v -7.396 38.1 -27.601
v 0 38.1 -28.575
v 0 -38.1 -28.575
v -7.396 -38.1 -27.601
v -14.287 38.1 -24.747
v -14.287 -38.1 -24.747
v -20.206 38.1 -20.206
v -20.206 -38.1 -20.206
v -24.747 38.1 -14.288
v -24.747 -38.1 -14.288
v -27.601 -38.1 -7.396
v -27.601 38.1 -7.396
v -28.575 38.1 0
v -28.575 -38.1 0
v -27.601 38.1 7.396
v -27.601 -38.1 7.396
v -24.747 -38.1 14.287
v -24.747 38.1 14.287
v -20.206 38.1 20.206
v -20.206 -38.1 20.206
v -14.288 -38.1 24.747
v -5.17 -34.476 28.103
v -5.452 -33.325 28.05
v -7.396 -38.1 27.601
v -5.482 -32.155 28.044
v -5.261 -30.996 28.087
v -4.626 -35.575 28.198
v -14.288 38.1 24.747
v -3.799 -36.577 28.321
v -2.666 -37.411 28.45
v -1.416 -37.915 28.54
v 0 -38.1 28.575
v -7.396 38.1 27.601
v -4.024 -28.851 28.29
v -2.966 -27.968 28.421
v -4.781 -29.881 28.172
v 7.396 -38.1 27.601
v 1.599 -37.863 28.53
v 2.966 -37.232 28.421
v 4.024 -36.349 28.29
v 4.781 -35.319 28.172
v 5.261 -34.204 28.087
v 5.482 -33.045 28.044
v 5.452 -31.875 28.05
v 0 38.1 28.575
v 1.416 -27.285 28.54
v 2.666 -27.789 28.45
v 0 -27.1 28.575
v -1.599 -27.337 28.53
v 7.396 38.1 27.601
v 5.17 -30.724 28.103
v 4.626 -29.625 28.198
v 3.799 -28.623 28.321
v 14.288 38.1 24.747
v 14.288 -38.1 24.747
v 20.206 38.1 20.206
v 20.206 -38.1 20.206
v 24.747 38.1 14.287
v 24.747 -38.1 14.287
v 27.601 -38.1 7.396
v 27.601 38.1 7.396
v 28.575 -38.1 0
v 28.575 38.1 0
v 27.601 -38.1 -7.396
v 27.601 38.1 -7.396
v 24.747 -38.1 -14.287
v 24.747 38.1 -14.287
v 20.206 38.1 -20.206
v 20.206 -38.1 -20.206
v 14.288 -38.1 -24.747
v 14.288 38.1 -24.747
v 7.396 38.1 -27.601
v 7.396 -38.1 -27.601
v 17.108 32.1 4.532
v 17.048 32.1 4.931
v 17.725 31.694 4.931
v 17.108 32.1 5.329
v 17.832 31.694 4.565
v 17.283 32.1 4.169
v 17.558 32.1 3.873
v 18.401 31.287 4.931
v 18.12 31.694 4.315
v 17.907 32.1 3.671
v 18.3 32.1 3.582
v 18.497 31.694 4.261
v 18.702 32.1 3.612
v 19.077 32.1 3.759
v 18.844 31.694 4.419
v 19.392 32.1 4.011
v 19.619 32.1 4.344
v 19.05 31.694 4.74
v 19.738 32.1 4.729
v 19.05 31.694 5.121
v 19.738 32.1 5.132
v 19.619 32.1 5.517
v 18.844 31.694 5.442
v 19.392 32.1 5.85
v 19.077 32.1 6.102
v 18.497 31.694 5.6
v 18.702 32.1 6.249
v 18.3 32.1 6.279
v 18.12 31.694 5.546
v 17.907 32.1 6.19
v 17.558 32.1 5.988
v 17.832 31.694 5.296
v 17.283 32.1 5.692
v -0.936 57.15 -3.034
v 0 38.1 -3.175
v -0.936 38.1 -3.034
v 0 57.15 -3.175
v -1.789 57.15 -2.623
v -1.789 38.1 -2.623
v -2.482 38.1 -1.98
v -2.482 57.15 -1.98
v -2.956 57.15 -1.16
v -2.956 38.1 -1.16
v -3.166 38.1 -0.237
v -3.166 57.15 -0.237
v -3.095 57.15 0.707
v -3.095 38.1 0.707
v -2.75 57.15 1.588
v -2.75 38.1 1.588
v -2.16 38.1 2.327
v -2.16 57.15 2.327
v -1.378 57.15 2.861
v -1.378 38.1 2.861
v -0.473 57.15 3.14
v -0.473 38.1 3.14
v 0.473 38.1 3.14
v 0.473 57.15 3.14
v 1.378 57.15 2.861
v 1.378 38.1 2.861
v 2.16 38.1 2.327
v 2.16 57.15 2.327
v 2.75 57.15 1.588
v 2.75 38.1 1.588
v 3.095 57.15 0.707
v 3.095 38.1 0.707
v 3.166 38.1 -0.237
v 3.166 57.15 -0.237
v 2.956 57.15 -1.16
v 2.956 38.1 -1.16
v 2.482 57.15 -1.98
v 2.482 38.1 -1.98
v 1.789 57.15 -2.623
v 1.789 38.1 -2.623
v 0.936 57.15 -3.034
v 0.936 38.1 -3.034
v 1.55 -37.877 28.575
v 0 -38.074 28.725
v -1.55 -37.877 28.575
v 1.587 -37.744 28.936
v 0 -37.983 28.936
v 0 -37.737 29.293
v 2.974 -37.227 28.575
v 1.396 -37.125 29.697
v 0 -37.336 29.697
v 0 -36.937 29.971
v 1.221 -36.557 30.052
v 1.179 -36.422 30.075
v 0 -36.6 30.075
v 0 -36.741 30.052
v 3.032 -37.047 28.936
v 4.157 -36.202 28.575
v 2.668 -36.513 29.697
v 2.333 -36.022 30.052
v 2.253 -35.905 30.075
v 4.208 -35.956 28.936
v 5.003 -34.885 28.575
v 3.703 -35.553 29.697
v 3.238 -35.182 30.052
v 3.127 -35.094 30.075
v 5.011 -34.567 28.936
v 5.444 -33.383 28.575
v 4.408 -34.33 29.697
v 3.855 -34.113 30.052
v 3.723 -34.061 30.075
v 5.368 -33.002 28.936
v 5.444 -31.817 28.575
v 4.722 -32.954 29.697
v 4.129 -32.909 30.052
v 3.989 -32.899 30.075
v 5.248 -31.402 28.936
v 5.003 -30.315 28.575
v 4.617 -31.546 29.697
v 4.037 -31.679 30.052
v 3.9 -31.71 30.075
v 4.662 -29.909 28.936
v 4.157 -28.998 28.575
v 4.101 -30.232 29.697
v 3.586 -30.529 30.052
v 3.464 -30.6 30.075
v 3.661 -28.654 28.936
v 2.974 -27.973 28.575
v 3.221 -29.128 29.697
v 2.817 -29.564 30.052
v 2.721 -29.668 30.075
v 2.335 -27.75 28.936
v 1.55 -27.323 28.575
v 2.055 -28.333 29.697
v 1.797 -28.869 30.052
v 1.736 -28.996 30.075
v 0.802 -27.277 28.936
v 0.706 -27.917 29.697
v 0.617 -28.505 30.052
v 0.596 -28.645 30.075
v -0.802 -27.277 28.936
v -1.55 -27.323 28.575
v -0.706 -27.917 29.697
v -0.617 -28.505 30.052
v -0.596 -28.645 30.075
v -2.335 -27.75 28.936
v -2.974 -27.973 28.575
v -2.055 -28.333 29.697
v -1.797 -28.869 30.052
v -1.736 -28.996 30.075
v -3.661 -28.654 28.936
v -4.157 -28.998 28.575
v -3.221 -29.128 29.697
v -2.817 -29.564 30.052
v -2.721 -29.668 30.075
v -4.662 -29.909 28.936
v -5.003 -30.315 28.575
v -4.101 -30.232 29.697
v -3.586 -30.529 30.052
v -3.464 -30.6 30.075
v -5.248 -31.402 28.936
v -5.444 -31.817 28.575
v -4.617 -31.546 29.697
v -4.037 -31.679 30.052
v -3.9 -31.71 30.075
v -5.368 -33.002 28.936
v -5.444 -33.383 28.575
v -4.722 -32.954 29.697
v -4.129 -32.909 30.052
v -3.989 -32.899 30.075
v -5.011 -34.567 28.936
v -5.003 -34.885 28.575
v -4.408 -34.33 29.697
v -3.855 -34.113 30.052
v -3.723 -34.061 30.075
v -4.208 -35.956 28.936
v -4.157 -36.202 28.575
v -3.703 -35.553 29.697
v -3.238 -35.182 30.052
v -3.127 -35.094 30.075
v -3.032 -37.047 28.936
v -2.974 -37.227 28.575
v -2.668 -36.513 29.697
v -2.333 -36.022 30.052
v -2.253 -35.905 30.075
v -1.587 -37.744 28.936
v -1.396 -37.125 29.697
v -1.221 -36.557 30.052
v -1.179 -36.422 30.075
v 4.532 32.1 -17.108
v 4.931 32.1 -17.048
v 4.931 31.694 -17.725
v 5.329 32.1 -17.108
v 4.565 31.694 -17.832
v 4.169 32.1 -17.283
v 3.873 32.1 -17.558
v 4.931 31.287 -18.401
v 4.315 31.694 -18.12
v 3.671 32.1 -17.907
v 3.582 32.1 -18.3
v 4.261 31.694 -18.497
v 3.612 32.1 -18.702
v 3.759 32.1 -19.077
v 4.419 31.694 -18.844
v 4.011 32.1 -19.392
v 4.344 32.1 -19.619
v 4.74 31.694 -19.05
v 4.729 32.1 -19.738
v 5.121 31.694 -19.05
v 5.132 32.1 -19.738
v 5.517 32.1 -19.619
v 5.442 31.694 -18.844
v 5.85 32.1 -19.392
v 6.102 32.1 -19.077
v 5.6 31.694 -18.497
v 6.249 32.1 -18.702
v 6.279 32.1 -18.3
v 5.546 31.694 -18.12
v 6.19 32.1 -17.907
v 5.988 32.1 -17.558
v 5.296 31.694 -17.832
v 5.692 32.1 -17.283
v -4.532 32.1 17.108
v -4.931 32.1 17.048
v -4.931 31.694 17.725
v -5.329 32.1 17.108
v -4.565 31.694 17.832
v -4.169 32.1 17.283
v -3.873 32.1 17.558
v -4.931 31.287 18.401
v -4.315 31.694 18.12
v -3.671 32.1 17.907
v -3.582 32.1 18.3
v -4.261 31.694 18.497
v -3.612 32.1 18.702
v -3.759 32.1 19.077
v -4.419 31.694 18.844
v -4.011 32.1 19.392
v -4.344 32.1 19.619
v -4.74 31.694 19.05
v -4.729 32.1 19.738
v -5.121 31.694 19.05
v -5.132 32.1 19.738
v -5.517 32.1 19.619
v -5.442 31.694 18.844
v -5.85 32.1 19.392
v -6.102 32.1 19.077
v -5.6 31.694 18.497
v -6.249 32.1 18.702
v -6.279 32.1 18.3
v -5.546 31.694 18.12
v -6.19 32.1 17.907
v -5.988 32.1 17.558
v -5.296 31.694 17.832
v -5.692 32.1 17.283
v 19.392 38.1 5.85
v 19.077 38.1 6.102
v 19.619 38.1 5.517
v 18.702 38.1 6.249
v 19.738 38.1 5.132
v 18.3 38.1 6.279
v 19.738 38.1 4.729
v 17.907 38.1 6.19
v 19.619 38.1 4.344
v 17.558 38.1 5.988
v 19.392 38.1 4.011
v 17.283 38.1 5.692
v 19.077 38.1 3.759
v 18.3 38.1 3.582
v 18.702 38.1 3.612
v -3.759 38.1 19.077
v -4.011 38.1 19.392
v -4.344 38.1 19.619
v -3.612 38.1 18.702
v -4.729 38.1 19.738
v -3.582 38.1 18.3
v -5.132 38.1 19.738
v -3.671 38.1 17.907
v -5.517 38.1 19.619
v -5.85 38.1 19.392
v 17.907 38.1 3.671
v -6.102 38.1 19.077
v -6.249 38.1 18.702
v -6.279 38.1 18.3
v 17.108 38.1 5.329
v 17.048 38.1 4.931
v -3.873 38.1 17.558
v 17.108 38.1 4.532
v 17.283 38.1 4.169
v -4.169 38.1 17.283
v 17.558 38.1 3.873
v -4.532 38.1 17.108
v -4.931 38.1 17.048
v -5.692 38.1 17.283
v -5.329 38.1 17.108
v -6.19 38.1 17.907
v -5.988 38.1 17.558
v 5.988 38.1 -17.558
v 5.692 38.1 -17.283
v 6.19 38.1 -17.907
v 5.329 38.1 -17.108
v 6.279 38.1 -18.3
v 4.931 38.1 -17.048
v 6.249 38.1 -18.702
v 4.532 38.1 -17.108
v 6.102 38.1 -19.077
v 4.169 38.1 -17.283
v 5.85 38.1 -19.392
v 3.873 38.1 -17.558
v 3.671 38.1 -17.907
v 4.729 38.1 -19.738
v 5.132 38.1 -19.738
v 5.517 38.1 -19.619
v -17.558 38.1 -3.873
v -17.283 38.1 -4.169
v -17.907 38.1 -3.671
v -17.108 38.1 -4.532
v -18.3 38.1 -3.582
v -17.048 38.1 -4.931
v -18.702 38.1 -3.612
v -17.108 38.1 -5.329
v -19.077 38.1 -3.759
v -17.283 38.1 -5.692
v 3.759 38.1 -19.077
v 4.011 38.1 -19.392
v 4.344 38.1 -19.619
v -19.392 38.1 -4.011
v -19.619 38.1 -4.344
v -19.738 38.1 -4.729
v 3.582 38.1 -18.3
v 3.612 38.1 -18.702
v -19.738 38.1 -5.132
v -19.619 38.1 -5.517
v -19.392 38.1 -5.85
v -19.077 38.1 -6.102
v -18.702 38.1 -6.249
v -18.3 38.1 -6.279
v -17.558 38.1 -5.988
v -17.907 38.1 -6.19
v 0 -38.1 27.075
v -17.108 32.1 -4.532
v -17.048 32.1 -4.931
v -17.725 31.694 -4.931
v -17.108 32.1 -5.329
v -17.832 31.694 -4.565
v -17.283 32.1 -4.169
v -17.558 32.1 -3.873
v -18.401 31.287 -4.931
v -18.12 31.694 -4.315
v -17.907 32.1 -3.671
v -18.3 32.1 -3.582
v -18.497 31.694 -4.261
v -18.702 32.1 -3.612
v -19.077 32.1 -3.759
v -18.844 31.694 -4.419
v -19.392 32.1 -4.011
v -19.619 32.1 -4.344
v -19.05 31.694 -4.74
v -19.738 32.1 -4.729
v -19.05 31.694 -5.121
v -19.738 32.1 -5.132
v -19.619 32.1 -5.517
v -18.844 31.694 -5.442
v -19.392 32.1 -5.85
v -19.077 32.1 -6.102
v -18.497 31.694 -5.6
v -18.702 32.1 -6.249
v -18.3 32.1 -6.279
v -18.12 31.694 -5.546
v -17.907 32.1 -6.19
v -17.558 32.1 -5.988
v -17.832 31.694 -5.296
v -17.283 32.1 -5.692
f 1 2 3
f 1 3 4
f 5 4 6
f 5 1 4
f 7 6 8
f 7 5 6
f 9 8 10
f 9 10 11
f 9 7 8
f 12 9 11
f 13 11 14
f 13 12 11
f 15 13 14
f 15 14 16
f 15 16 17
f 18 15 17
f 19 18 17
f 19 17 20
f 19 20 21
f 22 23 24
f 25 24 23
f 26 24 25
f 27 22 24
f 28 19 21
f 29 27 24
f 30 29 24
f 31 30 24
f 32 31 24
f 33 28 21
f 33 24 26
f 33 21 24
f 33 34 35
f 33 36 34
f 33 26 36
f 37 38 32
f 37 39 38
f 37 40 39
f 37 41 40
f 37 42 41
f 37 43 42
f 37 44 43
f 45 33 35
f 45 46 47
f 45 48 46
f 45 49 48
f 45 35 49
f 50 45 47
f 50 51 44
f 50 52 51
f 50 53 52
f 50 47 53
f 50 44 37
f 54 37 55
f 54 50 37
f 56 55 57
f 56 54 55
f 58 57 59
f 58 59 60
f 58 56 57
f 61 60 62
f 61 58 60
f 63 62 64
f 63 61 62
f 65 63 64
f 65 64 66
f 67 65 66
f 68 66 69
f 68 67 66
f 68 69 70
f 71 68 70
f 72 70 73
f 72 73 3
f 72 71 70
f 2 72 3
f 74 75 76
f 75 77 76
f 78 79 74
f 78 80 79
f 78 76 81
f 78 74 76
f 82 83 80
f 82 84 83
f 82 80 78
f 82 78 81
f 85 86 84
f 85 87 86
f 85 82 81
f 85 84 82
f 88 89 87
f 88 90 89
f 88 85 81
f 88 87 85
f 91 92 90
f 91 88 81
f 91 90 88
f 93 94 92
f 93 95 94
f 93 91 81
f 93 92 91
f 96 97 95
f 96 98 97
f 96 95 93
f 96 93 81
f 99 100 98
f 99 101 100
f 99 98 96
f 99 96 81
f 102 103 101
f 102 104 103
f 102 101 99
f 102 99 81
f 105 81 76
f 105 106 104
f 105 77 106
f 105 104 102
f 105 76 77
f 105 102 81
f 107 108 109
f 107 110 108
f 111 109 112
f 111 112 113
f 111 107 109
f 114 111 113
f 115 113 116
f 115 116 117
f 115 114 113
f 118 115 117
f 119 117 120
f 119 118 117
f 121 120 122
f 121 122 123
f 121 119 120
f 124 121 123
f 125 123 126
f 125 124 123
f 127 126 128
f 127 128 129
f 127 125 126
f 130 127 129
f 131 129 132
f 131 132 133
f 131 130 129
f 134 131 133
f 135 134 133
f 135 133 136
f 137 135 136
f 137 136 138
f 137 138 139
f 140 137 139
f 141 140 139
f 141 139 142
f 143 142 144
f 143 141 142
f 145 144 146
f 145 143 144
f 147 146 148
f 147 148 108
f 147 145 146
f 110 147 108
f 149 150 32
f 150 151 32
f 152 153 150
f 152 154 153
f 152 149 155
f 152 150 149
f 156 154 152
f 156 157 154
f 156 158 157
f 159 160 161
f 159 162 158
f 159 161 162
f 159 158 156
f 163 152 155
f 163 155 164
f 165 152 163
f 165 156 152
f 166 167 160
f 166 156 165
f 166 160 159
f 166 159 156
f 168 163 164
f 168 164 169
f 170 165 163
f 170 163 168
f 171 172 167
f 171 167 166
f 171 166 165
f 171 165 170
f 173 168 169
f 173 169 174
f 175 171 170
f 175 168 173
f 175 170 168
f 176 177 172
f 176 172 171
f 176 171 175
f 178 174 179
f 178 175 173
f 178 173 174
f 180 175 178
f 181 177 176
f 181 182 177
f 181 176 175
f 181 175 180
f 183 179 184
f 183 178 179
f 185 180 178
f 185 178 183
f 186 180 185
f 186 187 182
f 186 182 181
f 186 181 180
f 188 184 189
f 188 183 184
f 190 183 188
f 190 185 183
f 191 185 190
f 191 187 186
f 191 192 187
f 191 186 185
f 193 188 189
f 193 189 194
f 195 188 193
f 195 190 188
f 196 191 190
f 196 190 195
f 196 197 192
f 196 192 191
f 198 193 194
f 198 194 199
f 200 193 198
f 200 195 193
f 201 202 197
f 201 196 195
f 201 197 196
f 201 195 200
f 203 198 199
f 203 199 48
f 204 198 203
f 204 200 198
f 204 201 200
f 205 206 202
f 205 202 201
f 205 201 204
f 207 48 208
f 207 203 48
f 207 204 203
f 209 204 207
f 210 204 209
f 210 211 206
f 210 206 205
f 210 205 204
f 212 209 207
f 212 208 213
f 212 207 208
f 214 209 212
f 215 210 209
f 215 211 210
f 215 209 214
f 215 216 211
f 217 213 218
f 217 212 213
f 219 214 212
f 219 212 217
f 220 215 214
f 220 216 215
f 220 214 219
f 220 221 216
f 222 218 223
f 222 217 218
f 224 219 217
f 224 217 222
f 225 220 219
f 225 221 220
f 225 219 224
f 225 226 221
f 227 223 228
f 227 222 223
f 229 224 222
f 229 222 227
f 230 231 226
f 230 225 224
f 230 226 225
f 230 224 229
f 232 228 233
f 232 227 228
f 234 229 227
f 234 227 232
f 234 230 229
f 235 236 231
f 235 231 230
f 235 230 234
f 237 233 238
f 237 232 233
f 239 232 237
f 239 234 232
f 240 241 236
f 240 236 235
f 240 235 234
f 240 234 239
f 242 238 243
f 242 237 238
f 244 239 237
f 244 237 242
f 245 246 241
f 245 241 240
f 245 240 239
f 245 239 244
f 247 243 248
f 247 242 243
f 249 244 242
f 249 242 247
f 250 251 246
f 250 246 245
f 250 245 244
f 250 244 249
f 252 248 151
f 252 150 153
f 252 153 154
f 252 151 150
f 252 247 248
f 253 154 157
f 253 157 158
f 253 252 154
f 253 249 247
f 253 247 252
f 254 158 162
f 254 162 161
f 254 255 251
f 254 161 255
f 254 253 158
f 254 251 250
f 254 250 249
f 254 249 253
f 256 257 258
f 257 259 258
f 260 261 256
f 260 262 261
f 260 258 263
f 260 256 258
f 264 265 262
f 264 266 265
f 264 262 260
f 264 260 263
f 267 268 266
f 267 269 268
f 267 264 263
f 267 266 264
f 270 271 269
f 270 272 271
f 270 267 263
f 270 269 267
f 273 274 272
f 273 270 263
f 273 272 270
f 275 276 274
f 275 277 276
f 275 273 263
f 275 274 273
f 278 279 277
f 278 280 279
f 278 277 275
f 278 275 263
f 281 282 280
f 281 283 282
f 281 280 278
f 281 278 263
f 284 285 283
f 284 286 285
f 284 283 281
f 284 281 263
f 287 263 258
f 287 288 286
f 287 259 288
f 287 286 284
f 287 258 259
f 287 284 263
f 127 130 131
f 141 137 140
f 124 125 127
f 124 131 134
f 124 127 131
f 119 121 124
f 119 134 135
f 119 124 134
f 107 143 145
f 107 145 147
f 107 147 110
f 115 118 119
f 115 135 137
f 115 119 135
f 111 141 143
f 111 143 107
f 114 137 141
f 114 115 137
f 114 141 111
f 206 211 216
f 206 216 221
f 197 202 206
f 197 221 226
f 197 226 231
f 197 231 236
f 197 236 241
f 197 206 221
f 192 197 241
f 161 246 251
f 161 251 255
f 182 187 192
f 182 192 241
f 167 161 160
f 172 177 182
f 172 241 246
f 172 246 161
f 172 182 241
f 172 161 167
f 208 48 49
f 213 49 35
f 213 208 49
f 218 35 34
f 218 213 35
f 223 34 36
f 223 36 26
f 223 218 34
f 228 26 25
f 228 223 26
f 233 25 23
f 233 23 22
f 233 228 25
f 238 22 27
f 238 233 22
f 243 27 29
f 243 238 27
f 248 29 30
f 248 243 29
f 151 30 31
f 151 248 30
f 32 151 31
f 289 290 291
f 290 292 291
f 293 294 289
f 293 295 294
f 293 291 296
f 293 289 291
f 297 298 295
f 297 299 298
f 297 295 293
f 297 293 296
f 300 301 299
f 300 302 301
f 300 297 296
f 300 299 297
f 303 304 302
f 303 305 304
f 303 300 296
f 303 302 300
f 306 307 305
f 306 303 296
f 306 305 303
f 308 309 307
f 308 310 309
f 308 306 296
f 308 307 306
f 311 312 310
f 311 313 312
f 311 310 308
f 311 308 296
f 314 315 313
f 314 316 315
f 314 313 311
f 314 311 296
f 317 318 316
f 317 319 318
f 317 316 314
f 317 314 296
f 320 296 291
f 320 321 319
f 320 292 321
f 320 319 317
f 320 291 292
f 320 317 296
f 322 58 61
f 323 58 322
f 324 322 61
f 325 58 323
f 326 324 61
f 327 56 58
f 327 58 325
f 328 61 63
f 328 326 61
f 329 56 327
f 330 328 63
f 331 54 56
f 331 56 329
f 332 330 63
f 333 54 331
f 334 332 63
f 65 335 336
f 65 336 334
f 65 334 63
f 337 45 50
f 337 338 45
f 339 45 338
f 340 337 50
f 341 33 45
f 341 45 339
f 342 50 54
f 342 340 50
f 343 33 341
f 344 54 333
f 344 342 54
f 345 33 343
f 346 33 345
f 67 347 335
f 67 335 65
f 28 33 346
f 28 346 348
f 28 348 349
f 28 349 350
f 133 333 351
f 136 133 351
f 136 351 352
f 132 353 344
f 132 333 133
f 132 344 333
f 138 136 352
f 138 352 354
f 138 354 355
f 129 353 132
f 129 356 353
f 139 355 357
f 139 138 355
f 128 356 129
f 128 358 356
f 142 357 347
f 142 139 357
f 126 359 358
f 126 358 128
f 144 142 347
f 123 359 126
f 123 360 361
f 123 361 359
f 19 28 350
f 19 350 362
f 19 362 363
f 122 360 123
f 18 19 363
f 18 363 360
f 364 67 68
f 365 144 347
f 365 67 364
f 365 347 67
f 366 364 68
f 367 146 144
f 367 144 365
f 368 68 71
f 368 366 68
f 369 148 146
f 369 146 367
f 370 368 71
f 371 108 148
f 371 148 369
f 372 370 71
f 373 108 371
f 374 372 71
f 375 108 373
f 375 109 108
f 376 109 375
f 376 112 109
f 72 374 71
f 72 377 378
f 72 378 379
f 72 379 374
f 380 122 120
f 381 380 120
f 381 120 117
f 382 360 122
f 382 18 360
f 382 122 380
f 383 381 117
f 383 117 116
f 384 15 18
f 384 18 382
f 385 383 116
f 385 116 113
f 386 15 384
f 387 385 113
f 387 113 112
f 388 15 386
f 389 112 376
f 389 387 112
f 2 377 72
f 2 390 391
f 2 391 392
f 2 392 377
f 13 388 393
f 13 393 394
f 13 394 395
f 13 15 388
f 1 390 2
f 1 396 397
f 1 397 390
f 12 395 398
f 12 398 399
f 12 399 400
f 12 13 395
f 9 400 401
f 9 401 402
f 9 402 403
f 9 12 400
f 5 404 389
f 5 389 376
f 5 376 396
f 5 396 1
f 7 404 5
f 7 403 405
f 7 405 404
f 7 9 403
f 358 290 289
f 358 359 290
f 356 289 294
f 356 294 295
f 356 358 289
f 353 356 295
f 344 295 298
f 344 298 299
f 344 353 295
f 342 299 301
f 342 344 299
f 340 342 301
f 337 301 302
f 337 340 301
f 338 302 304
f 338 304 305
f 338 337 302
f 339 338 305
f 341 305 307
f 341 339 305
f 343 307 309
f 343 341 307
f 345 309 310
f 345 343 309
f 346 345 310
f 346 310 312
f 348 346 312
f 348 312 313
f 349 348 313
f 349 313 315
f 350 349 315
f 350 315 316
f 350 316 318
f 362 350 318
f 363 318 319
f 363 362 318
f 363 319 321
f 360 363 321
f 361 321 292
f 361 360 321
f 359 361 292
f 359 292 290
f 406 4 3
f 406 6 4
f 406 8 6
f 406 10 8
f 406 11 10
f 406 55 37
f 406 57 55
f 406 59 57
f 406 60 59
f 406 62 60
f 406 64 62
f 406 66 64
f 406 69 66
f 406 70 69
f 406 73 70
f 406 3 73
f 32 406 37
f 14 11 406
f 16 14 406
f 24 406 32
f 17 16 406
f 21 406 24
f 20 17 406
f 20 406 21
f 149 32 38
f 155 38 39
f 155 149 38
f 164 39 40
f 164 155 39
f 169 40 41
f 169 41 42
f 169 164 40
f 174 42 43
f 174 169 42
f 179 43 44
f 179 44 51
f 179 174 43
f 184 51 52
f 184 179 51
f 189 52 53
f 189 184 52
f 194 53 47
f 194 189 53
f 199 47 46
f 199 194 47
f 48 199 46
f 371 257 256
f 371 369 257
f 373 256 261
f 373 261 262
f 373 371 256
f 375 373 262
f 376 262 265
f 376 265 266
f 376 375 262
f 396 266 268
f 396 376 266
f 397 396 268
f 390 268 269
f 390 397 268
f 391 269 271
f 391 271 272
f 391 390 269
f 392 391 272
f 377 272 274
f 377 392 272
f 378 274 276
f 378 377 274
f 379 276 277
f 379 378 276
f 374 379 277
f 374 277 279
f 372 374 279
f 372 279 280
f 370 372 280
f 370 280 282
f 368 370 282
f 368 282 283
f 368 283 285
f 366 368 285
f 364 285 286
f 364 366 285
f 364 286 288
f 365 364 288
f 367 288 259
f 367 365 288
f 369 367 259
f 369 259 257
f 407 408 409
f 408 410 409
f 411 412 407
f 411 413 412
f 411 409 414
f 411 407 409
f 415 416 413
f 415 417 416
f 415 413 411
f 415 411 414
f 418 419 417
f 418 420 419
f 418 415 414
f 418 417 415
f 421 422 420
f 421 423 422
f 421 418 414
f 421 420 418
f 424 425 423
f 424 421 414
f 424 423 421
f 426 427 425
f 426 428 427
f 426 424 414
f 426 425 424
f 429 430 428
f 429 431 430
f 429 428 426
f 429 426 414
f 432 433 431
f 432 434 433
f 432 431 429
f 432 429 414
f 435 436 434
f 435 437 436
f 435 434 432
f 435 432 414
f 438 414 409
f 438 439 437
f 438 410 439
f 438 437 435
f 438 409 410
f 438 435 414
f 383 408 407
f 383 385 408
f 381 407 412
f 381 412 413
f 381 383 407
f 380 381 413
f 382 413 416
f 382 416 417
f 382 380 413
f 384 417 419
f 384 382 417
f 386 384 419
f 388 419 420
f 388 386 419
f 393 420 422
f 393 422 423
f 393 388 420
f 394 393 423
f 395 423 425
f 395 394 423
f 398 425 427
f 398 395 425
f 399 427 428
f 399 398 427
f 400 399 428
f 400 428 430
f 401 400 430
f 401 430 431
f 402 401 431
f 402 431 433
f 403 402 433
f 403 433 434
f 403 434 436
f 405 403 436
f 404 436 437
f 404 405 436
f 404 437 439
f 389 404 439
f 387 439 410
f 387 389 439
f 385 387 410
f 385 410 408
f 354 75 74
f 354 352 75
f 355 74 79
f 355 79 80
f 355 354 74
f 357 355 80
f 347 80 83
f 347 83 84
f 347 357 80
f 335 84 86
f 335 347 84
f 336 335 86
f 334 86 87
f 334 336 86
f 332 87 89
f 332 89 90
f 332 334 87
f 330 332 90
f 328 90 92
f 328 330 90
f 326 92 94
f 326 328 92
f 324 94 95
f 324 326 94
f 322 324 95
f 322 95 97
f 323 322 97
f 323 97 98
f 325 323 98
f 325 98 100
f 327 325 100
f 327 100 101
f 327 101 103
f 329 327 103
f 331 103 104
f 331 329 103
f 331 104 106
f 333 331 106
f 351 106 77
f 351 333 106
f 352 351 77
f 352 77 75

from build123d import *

# Parameters (mm, degrees)
SKETCH2_R           = 5.5
BOSS_EXTRUDE1_DEPTH = 1.5
CIRPATTERN1_COUNT   = 4
FILLET2_SIZE        = 1.5


with BuildPart() as part:
    # Sketch1 → Revolve1 (revolve)
    with BuildSketch(Plane.XY, mode=Mode.PRIVATE) as revolve1_sk:
        Polygon((0, 38.1), (0, -38.1), (28.575, -38.1), (28.575, 38.1), (3.175, 38.1), (3.175, 57.15), (0, 57.15), align=None)
    revolve(revolve1_sk.sketch.rotate(Axis((0, 0, 0), (0, 1, 0)), 90), axis=Axis((0, 0, 0), (0, 1, 0)))

    # Sketch2 → Boss-Extrude1 (add, symmetric)
    with BuildSketch(Plane.XY.offset(28.575)):
        with Locations(Location((0, -32.6, 0), (0, 0, 270))):
            Circle(SKETCH2_R)
    extrude(amount=BOSS_EXTRUDE1_DEPTH, both=True)

    # Sketch5 → #6-32 Tapped Hole1 (revolve, cut)
    with BuildSketch(Plane(origin=(4.930502809, 38.1, -18.400886991), x_dir=(0, 0, 1), z_dir=(1, 0, 0))):
        Polygon((0, 0), (0, 6.81269403), (1.35255, 6), (1.35255, 0), align=None)
    f_6_32_tapped_hole1 = revolve(axis=Axis((4.930502809, 44.45, -18.400886991), (0, -1, 0)), mode=Mode.SUBTRACT)

    # CirPattern1: #6-32 Tapped Hole1 ×4 about axis
    cirpattern1_axis = Axis((0, 0, 0), (0, 1, 0))
    for i in range(1, CIRPATTERN1_COUNT):
        add(f_6_32_tapped_hole1.rotate(cirpattern1_axis, i * 360 / CIRPATTERN1_COUNT), mode=Mode.SUBTRACT)

    # Fillet2
    # a fillet whose section is not a circle: 1.5 mm, written as the material it takes off along each edge
    with BuildSketch(Plane(origin=(0, -32.6, 30.075), x_dir=(0, -1, 0), z_dir=(-1, 0, 0))) as fillet2_piece_1_section:
        with BuildLine():
            Bezier((5.5, -FILLET2_SIZE), (5.5, 0), (5.5 - FILLET2_SIZE, 0), weights=[1, 0.333333333, 1])
            Line((5.5 - FILLET2_SIZE, 0), (5.5, 0))
            Line((5.5, 0), (5.5, -FILLET2_SIZE))
        make_face()
    fillet2_piece_1 = revolve(axis=Axis((0, -32.6, 30.075), (0, 0, 1)), mode=Mode.PRIVATE)
    fillet2_piece_1 = fillet2_piece_1 - Plane(origin=(0, -32.6, 0), x_dir=(0, 0, -1), z_dir=(0, 1, 0)) * Cylinder(28.575, 22, mode=Mode.PRIVATE)
    add(fillet2_piece_1, mode=Mode.SUBTRACT)


solid = part.part
